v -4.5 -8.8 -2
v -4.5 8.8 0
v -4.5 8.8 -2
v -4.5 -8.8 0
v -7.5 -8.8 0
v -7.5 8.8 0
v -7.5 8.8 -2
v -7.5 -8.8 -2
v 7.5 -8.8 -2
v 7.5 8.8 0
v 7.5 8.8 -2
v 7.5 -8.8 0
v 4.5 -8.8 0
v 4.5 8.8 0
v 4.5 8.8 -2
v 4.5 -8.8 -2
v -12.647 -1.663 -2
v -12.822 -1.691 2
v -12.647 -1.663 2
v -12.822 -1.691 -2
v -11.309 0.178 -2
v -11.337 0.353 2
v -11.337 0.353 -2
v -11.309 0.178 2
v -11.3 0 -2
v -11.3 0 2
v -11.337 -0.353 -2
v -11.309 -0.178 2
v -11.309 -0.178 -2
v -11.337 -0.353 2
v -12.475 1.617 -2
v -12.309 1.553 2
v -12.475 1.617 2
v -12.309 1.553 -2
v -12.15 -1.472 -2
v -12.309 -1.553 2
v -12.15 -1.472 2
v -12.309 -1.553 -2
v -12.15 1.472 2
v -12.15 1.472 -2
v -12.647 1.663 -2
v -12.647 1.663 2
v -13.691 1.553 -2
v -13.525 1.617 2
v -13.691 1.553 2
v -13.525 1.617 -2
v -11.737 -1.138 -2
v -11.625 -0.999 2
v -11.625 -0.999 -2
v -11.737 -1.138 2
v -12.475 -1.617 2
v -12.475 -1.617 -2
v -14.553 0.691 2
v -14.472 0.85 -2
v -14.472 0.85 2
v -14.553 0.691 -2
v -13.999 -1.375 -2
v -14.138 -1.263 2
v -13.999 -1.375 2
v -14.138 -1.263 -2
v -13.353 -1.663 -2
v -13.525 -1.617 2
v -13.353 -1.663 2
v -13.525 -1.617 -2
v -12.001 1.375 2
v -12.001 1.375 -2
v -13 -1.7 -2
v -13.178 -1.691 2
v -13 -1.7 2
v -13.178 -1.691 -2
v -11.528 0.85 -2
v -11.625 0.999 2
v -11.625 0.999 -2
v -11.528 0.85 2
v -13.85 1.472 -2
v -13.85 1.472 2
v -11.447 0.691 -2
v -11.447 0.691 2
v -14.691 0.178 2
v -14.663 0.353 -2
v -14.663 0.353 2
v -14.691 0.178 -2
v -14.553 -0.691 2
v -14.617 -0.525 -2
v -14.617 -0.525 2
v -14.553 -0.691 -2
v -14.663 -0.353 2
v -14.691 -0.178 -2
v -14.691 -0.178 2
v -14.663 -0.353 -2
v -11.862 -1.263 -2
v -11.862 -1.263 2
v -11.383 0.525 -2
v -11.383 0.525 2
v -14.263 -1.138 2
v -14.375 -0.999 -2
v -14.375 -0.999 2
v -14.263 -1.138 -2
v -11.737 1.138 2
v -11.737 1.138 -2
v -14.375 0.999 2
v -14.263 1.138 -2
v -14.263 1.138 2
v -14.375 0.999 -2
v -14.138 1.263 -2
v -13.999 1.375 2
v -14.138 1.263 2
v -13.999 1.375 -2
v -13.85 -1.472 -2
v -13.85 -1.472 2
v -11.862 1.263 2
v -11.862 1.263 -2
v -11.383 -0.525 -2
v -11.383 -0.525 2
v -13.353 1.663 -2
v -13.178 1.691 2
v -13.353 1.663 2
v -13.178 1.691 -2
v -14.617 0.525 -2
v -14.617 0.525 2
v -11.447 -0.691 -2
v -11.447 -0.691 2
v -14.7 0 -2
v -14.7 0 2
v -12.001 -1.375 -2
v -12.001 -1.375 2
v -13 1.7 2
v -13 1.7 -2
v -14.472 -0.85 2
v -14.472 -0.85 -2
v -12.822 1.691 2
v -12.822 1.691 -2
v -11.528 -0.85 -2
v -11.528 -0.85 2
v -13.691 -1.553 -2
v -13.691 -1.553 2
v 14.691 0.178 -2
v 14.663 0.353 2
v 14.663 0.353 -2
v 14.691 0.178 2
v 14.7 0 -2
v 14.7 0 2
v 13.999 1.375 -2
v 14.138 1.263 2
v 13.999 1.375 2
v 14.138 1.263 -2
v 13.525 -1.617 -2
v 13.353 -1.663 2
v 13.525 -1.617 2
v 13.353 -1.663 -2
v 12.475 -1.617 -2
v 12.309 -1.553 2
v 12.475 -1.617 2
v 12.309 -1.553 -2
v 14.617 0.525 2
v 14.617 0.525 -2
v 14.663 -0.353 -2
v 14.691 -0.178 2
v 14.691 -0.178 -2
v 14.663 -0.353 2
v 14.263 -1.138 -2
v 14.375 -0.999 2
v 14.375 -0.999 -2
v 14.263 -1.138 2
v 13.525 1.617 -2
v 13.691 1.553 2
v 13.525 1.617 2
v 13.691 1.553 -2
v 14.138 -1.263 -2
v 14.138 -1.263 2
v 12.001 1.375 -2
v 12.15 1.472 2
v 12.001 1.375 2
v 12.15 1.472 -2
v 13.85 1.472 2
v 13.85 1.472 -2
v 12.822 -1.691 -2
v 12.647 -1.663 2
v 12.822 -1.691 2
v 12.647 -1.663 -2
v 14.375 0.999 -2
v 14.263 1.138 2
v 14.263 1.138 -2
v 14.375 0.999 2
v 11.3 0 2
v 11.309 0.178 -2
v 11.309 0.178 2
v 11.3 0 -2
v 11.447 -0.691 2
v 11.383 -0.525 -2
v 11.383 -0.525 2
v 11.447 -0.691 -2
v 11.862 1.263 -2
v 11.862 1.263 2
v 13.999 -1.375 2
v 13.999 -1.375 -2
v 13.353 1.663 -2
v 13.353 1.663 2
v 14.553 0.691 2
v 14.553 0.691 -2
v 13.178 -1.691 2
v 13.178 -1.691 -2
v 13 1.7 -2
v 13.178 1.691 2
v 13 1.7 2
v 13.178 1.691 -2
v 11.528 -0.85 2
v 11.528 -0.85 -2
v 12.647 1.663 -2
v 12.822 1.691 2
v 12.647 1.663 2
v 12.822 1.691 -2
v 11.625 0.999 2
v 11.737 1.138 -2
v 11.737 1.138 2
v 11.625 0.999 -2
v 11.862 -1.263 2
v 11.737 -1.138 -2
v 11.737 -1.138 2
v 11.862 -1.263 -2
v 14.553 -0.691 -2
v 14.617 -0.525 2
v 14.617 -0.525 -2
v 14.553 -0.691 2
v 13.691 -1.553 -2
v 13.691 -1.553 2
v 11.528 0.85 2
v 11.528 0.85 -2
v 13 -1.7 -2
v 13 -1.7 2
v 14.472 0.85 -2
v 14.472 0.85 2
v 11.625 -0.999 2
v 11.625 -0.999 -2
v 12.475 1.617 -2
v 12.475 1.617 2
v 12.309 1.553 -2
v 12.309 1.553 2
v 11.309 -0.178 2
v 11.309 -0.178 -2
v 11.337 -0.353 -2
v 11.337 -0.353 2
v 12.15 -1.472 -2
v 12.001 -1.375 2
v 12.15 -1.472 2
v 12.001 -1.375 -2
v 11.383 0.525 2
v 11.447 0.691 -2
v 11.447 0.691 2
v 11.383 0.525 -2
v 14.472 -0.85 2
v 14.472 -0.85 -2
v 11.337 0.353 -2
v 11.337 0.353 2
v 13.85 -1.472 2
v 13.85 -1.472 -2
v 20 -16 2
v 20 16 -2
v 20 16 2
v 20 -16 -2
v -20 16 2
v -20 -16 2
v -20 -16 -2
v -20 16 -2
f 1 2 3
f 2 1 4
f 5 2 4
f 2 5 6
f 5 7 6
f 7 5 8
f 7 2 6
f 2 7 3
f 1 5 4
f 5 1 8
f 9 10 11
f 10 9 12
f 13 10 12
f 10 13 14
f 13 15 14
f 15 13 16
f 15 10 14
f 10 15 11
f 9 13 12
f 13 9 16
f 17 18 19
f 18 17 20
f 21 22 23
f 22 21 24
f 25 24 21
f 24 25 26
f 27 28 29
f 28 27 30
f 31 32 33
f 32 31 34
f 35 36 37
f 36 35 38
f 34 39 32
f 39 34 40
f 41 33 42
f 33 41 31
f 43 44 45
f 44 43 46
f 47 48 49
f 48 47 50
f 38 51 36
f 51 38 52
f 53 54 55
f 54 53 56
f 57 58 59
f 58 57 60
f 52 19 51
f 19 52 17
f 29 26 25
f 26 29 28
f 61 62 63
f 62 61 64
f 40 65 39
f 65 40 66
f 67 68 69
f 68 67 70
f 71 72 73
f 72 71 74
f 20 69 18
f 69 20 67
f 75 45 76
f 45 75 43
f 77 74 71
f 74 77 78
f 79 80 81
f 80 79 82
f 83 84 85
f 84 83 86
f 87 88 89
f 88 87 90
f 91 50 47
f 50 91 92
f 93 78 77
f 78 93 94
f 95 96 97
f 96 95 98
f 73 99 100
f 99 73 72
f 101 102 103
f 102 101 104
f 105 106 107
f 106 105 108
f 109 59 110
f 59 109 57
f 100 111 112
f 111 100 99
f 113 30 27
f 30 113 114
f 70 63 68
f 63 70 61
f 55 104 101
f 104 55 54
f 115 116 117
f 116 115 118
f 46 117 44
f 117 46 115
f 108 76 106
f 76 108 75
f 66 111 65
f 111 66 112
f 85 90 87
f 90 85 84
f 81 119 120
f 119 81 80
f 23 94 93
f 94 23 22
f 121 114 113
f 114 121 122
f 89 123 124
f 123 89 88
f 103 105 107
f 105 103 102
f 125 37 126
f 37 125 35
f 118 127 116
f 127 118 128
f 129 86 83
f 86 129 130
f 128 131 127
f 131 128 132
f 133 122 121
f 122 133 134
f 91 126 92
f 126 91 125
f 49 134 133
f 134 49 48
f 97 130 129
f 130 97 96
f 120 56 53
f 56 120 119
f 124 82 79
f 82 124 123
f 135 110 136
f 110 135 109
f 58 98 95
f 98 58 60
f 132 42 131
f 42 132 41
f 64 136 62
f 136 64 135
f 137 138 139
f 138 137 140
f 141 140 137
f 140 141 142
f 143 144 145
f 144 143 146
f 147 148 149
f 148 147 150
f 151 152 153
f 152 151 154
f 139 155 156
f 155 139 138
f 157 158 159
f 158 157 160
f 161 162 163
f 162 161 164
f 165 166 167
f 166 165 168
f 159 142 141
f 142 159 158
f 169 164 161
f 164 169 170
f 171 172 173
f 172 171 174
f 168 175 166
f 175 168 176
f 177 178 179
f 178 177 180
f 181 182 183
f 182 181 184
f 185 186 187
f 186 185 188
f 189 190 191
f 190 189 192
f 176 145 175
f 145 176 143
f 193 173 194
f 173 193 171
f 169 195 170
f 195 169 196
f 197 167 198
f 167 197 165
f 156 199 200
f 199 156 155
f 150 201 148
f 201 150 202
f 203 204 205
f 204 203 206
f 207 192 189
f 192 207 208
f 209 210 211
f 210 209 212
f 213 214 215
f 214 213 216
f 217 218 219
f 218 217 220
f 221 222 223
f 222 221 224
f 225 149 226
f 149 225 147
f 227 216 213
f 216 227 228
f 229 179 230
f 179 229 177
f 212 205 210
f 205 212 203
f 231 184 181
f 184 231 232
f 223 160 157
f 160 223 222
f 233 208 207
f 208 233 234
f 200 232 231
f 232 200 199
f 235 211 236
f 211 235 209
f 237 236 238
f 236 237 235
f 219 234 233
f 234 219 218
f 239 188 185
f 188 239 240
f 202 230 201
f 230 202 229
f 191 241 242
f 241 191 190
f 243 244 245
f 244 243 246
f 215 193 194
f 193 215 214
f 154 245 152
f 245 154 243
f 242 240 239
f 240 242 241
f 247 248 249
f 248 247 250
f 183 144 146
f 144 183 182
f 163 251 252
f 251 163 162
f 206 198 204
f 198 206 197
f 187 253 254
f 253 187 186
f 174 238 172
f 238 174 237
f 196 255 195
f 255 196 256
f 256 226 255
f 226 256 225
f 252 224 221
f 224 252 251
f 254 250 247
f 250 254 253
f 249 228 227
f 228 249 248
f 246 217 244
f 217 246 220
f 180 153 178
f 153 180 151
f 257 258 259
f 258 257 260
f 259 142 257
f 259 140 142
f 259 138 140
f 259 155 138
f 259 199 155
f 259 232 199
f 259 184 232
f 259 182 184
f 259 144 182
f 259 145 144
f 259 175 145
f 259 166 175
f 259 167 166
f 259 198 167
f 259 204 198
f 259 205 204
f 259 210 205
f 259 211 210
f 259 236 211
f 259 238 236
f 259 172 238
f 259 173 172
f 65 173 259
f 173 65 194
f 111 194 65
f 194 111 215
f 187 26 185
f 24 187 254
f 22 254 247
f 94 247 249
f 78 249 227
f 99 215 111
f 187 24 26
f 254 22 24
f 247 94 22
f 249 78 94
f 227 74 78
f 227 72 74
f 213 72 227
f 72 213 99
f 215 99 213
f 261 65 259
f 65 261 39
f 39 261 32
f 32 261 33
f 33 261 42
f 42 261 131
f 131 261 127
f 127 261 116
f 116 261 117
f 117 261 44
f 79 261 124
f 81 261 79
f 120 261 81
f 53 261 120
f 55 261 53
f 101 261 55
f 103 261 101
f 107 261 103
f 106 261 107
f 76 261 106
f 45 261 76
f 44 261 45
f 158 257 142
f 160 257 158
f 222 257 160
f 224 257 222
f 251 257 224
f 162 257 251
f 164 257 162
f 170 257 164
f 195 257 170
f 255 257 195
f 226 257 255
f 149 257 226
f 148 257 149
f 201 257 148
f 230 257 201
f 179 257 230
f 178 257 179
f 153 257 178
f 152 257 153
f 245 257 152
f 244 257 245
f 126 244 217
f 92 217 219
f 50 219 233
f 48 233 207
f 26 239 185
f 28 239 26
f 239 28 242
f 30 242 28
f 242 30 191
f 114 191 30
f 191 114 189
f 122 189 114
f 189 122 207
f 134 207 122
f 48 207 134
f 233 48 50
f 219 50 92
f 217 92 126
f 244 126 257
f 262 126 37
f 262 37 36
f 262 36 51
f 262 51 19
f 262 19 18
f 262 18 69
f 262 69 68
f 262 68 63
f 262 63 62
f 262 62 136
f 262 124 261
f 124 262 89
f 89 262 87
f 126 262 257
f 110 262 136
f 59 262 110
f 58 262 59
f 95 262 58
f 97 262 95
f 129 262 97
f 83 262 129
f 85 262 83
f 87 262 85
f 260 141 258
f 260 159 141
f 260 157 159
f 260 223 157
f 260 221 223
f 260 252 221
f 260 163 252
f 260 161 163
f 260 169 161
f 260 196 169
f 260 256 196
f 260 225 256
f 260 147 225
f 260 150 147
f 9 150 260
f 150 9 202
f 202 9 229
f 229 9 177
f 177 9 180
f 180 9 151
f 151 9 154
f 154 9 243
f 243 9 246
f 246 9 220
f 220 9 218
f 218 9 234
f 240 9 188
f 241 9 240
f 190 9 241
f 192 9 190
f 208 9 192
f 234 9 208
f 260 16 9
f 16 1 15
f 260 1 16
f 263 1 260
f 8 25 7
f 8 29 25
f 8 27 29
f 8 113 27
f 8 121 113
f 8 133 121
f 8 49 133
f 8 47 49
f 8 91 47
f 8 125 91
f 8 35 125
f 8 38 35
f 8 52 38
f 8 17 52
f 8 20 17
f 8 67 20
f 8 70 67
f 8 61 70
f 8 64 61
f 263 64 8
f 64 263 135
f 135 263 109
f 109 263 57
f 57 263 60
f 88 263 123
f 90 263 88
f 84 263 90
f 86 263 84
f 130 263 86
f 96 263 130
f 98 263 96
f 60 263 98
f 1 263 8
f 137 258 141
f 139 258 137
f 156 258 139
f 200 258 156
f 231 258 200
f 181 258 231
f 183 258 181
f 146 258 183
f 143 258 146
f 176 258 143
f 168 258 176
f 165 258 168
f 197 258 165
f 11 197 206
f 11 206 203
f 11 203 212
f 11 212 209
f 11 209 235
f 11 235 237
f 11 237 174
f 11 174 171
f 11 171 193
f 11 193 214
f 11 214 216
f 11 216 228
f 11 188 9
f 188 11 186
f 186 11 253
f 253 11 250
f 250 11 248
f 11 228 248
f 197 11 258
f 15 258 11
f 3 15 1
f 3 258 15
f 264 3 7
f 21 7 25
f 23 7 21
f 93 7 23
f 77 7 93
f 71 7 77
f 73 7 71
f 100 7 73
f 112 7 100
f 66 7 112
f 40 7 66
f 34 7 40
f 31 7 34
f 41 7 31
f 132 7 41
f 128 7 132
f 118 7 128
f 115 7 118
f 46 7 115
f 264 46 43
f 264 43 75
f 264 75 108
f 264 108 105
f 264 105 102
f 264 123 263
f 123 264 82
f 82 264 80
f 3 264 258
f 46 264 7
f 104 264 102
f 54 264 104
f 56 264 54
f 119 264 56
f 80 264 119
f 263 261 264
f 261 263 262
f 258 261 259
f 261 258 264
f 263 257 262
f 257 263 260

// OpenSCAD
// Cable-tie base with two strap slots.
$fn = 60;
eps = 0.02;
base_w = 32;
base_l = 40;
base_t = 4;
slot_w = 3;
slot_l = 12;
difference() {
    cube([base_l,base_w,base_t],center=true);
    for (x=[-slot_l/2,slot_l/2]) translate([x,0,-base_t/2-eps]) cube([slot_w,base_w*0.55,base_t+2*eps],center=true);
    for (x=[-base_l/2+7,base_l/2-7]) translate([x,0,-base_t/2-eps]) cylinder(d=3.4,h=base_t+2*eps);
}
